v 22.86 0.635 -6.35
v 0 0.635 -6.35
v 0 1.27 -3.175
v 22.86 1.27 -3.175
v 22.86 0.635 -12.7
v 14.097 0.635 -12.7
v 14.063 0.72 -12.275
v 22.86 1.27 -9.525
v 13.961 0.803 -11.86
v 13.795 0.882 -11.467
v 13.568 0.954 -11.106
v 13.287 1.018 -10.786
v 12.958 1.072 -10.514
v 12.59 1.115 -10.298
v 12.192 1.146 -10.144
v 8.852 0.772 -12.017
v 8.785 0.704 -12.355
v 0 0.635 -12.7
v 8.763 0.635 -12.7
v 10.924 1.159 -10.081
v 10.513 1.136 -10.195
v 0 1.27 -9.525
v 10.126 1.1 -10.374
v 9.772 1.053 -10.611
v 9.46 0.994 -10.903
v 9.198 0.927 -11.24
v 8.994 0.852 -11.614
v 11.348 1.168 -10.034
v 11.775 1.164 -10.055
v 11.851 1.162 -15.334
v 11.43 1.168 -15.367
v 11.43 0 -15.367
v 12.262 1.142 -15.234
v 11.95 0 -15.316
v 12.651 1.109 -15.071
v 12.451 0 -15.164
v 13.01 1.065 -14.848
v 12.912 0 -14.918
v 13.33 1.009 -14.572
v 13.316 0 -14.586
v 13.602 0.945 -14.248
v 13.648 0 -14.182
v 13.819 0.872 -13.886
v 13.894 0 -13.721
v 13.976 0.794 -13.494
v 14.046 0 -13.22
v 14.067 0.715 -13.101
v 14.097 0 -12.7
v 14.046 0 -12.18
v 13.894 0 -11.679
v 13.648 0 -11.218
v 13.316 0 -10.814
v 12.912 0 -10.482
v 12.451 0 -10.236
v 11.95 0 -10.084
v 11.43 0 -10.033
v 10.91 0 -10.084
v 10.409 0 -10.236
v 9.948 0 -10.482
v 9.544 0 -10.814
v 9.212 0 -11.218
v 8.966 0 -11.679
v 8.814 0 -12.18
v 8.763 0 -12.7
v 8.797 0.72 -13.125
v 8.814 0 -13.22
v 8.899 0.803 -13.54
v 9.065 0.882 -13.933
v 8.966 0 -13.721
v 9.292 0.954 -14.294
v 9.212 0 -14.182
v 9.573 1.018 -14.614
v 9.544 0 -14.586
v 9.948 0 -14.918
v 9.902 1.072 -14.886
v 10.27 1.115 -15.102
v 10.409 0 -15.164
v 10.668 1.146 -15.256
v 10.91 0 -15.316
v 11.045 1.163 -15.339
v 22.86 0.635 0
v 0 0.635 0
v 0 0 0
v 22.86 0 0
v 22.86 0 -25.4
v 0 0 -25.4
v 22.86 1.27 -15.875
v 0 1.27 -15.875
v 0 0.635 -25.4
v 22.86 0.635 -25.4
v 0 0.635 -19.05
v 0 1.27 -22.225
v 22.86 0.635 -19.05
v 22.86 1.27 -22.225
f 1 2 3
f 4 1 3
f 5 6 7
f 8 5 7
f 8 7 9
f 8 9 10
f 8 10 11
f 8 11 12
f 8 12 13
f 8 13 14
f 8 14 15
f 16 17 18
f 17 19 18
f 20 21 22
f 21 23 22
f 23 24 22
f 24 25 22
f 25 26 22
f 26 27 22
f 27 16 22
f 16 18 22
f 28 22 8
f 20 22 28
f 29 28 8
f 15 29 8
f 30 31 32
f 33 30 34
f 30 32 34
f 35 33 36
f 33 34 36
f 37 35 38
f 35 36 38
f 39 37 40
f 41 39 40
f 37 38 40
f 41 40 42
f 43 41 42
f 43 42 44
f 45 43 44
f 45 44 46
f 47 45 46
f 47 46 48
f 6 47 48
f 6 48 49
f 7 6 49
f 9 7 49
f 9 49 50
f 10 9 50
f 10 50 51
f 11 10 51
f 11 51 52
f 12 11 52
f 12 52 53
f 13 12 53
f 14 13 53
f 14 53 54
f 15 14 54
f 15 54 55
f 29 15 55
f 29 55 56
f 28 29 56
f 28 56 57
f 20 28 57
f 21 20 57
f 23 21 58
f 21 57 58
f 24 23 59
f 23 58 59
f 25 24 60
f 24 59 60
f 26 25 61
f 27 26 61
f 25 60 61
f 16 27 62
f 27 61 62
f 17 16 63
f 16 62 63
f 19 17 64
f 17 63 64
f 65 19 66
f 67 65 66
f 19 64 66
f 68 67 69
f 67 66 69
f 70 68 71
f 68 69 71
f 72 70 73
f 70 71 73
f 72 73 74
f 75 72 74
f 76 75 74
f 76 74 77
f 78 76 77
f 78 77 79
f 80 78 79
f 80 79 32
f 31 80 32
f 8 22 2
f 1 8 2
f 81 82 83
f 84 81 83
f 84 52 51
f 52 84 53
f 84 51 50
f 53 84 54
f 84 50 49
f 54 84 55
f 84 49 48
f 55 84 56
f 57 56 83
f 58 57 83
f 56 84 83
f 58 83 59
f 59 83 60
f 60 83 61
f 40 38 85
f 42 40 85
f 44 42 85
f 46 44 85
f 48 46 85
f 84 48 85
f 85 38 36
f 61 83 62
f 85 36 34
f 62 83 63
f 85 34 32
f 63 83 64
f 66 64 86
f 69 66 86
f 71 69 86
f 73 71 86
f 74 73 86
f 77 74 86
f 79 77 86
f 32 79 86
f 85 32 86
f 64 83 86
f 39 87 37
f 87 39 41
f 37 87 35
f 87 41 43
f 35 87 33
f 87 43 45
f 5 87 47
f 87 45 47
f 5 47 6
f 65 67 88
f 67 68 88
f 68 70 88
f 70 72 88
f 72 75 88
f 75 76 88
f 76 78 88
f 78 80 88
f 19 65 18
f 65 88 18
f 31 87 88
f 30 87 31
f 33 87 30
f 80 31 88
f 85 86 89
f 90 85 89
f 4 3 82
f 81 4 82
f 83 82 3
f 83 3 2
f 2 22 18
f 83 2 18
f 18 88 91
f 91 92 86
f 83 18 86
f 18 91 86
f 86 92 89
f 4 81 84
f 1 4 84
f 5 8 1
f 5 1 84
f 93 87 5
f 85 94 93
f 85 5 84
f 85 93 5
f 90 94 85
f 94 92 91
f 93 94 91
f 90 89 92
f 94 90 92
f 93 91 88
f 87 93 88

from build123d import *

# Parameters (mm, degrees)
BOSS_EXTRUDE1_DEPTH = 22.86
SKETCH7_R           = 2.667
CUT_EXTRUDE1_DEPTH  = 22.86


with BuildPart() as part:
    # Sketch6 → Boss-Extrude1 (new body)
    with BuildSketch(Plane(origin=(0, 0, 0), x_dir=(0, 0, -1), z_dir=(1, 0, 0))):
        Polygon((0, 0), (25.4, 0), (25.4, 0.635), (22.225, 1.27), (19.05, 0.635), (15.875, 1.27), (12.7, 0.635), (9.525, 1.27), (6.35, 0.635), (3.175, 1.27), (0, 0.635), align=None)
    extrude(amount=BOSS_EXTRUDE1_DEPTH)

    # Sketch7 → Cut-Extrude1 (cut)
    with BuildSketch(Plane.XZ):
        with Locations(Location((11.43, -12.7, 0), (0, 0, 270))):
            Circle(SKETCH7_R)
    extrude(amount=-CUT_EXTRUDE1_DEPTH, mode=Mode.SUBTRACT)


solid = part.part
